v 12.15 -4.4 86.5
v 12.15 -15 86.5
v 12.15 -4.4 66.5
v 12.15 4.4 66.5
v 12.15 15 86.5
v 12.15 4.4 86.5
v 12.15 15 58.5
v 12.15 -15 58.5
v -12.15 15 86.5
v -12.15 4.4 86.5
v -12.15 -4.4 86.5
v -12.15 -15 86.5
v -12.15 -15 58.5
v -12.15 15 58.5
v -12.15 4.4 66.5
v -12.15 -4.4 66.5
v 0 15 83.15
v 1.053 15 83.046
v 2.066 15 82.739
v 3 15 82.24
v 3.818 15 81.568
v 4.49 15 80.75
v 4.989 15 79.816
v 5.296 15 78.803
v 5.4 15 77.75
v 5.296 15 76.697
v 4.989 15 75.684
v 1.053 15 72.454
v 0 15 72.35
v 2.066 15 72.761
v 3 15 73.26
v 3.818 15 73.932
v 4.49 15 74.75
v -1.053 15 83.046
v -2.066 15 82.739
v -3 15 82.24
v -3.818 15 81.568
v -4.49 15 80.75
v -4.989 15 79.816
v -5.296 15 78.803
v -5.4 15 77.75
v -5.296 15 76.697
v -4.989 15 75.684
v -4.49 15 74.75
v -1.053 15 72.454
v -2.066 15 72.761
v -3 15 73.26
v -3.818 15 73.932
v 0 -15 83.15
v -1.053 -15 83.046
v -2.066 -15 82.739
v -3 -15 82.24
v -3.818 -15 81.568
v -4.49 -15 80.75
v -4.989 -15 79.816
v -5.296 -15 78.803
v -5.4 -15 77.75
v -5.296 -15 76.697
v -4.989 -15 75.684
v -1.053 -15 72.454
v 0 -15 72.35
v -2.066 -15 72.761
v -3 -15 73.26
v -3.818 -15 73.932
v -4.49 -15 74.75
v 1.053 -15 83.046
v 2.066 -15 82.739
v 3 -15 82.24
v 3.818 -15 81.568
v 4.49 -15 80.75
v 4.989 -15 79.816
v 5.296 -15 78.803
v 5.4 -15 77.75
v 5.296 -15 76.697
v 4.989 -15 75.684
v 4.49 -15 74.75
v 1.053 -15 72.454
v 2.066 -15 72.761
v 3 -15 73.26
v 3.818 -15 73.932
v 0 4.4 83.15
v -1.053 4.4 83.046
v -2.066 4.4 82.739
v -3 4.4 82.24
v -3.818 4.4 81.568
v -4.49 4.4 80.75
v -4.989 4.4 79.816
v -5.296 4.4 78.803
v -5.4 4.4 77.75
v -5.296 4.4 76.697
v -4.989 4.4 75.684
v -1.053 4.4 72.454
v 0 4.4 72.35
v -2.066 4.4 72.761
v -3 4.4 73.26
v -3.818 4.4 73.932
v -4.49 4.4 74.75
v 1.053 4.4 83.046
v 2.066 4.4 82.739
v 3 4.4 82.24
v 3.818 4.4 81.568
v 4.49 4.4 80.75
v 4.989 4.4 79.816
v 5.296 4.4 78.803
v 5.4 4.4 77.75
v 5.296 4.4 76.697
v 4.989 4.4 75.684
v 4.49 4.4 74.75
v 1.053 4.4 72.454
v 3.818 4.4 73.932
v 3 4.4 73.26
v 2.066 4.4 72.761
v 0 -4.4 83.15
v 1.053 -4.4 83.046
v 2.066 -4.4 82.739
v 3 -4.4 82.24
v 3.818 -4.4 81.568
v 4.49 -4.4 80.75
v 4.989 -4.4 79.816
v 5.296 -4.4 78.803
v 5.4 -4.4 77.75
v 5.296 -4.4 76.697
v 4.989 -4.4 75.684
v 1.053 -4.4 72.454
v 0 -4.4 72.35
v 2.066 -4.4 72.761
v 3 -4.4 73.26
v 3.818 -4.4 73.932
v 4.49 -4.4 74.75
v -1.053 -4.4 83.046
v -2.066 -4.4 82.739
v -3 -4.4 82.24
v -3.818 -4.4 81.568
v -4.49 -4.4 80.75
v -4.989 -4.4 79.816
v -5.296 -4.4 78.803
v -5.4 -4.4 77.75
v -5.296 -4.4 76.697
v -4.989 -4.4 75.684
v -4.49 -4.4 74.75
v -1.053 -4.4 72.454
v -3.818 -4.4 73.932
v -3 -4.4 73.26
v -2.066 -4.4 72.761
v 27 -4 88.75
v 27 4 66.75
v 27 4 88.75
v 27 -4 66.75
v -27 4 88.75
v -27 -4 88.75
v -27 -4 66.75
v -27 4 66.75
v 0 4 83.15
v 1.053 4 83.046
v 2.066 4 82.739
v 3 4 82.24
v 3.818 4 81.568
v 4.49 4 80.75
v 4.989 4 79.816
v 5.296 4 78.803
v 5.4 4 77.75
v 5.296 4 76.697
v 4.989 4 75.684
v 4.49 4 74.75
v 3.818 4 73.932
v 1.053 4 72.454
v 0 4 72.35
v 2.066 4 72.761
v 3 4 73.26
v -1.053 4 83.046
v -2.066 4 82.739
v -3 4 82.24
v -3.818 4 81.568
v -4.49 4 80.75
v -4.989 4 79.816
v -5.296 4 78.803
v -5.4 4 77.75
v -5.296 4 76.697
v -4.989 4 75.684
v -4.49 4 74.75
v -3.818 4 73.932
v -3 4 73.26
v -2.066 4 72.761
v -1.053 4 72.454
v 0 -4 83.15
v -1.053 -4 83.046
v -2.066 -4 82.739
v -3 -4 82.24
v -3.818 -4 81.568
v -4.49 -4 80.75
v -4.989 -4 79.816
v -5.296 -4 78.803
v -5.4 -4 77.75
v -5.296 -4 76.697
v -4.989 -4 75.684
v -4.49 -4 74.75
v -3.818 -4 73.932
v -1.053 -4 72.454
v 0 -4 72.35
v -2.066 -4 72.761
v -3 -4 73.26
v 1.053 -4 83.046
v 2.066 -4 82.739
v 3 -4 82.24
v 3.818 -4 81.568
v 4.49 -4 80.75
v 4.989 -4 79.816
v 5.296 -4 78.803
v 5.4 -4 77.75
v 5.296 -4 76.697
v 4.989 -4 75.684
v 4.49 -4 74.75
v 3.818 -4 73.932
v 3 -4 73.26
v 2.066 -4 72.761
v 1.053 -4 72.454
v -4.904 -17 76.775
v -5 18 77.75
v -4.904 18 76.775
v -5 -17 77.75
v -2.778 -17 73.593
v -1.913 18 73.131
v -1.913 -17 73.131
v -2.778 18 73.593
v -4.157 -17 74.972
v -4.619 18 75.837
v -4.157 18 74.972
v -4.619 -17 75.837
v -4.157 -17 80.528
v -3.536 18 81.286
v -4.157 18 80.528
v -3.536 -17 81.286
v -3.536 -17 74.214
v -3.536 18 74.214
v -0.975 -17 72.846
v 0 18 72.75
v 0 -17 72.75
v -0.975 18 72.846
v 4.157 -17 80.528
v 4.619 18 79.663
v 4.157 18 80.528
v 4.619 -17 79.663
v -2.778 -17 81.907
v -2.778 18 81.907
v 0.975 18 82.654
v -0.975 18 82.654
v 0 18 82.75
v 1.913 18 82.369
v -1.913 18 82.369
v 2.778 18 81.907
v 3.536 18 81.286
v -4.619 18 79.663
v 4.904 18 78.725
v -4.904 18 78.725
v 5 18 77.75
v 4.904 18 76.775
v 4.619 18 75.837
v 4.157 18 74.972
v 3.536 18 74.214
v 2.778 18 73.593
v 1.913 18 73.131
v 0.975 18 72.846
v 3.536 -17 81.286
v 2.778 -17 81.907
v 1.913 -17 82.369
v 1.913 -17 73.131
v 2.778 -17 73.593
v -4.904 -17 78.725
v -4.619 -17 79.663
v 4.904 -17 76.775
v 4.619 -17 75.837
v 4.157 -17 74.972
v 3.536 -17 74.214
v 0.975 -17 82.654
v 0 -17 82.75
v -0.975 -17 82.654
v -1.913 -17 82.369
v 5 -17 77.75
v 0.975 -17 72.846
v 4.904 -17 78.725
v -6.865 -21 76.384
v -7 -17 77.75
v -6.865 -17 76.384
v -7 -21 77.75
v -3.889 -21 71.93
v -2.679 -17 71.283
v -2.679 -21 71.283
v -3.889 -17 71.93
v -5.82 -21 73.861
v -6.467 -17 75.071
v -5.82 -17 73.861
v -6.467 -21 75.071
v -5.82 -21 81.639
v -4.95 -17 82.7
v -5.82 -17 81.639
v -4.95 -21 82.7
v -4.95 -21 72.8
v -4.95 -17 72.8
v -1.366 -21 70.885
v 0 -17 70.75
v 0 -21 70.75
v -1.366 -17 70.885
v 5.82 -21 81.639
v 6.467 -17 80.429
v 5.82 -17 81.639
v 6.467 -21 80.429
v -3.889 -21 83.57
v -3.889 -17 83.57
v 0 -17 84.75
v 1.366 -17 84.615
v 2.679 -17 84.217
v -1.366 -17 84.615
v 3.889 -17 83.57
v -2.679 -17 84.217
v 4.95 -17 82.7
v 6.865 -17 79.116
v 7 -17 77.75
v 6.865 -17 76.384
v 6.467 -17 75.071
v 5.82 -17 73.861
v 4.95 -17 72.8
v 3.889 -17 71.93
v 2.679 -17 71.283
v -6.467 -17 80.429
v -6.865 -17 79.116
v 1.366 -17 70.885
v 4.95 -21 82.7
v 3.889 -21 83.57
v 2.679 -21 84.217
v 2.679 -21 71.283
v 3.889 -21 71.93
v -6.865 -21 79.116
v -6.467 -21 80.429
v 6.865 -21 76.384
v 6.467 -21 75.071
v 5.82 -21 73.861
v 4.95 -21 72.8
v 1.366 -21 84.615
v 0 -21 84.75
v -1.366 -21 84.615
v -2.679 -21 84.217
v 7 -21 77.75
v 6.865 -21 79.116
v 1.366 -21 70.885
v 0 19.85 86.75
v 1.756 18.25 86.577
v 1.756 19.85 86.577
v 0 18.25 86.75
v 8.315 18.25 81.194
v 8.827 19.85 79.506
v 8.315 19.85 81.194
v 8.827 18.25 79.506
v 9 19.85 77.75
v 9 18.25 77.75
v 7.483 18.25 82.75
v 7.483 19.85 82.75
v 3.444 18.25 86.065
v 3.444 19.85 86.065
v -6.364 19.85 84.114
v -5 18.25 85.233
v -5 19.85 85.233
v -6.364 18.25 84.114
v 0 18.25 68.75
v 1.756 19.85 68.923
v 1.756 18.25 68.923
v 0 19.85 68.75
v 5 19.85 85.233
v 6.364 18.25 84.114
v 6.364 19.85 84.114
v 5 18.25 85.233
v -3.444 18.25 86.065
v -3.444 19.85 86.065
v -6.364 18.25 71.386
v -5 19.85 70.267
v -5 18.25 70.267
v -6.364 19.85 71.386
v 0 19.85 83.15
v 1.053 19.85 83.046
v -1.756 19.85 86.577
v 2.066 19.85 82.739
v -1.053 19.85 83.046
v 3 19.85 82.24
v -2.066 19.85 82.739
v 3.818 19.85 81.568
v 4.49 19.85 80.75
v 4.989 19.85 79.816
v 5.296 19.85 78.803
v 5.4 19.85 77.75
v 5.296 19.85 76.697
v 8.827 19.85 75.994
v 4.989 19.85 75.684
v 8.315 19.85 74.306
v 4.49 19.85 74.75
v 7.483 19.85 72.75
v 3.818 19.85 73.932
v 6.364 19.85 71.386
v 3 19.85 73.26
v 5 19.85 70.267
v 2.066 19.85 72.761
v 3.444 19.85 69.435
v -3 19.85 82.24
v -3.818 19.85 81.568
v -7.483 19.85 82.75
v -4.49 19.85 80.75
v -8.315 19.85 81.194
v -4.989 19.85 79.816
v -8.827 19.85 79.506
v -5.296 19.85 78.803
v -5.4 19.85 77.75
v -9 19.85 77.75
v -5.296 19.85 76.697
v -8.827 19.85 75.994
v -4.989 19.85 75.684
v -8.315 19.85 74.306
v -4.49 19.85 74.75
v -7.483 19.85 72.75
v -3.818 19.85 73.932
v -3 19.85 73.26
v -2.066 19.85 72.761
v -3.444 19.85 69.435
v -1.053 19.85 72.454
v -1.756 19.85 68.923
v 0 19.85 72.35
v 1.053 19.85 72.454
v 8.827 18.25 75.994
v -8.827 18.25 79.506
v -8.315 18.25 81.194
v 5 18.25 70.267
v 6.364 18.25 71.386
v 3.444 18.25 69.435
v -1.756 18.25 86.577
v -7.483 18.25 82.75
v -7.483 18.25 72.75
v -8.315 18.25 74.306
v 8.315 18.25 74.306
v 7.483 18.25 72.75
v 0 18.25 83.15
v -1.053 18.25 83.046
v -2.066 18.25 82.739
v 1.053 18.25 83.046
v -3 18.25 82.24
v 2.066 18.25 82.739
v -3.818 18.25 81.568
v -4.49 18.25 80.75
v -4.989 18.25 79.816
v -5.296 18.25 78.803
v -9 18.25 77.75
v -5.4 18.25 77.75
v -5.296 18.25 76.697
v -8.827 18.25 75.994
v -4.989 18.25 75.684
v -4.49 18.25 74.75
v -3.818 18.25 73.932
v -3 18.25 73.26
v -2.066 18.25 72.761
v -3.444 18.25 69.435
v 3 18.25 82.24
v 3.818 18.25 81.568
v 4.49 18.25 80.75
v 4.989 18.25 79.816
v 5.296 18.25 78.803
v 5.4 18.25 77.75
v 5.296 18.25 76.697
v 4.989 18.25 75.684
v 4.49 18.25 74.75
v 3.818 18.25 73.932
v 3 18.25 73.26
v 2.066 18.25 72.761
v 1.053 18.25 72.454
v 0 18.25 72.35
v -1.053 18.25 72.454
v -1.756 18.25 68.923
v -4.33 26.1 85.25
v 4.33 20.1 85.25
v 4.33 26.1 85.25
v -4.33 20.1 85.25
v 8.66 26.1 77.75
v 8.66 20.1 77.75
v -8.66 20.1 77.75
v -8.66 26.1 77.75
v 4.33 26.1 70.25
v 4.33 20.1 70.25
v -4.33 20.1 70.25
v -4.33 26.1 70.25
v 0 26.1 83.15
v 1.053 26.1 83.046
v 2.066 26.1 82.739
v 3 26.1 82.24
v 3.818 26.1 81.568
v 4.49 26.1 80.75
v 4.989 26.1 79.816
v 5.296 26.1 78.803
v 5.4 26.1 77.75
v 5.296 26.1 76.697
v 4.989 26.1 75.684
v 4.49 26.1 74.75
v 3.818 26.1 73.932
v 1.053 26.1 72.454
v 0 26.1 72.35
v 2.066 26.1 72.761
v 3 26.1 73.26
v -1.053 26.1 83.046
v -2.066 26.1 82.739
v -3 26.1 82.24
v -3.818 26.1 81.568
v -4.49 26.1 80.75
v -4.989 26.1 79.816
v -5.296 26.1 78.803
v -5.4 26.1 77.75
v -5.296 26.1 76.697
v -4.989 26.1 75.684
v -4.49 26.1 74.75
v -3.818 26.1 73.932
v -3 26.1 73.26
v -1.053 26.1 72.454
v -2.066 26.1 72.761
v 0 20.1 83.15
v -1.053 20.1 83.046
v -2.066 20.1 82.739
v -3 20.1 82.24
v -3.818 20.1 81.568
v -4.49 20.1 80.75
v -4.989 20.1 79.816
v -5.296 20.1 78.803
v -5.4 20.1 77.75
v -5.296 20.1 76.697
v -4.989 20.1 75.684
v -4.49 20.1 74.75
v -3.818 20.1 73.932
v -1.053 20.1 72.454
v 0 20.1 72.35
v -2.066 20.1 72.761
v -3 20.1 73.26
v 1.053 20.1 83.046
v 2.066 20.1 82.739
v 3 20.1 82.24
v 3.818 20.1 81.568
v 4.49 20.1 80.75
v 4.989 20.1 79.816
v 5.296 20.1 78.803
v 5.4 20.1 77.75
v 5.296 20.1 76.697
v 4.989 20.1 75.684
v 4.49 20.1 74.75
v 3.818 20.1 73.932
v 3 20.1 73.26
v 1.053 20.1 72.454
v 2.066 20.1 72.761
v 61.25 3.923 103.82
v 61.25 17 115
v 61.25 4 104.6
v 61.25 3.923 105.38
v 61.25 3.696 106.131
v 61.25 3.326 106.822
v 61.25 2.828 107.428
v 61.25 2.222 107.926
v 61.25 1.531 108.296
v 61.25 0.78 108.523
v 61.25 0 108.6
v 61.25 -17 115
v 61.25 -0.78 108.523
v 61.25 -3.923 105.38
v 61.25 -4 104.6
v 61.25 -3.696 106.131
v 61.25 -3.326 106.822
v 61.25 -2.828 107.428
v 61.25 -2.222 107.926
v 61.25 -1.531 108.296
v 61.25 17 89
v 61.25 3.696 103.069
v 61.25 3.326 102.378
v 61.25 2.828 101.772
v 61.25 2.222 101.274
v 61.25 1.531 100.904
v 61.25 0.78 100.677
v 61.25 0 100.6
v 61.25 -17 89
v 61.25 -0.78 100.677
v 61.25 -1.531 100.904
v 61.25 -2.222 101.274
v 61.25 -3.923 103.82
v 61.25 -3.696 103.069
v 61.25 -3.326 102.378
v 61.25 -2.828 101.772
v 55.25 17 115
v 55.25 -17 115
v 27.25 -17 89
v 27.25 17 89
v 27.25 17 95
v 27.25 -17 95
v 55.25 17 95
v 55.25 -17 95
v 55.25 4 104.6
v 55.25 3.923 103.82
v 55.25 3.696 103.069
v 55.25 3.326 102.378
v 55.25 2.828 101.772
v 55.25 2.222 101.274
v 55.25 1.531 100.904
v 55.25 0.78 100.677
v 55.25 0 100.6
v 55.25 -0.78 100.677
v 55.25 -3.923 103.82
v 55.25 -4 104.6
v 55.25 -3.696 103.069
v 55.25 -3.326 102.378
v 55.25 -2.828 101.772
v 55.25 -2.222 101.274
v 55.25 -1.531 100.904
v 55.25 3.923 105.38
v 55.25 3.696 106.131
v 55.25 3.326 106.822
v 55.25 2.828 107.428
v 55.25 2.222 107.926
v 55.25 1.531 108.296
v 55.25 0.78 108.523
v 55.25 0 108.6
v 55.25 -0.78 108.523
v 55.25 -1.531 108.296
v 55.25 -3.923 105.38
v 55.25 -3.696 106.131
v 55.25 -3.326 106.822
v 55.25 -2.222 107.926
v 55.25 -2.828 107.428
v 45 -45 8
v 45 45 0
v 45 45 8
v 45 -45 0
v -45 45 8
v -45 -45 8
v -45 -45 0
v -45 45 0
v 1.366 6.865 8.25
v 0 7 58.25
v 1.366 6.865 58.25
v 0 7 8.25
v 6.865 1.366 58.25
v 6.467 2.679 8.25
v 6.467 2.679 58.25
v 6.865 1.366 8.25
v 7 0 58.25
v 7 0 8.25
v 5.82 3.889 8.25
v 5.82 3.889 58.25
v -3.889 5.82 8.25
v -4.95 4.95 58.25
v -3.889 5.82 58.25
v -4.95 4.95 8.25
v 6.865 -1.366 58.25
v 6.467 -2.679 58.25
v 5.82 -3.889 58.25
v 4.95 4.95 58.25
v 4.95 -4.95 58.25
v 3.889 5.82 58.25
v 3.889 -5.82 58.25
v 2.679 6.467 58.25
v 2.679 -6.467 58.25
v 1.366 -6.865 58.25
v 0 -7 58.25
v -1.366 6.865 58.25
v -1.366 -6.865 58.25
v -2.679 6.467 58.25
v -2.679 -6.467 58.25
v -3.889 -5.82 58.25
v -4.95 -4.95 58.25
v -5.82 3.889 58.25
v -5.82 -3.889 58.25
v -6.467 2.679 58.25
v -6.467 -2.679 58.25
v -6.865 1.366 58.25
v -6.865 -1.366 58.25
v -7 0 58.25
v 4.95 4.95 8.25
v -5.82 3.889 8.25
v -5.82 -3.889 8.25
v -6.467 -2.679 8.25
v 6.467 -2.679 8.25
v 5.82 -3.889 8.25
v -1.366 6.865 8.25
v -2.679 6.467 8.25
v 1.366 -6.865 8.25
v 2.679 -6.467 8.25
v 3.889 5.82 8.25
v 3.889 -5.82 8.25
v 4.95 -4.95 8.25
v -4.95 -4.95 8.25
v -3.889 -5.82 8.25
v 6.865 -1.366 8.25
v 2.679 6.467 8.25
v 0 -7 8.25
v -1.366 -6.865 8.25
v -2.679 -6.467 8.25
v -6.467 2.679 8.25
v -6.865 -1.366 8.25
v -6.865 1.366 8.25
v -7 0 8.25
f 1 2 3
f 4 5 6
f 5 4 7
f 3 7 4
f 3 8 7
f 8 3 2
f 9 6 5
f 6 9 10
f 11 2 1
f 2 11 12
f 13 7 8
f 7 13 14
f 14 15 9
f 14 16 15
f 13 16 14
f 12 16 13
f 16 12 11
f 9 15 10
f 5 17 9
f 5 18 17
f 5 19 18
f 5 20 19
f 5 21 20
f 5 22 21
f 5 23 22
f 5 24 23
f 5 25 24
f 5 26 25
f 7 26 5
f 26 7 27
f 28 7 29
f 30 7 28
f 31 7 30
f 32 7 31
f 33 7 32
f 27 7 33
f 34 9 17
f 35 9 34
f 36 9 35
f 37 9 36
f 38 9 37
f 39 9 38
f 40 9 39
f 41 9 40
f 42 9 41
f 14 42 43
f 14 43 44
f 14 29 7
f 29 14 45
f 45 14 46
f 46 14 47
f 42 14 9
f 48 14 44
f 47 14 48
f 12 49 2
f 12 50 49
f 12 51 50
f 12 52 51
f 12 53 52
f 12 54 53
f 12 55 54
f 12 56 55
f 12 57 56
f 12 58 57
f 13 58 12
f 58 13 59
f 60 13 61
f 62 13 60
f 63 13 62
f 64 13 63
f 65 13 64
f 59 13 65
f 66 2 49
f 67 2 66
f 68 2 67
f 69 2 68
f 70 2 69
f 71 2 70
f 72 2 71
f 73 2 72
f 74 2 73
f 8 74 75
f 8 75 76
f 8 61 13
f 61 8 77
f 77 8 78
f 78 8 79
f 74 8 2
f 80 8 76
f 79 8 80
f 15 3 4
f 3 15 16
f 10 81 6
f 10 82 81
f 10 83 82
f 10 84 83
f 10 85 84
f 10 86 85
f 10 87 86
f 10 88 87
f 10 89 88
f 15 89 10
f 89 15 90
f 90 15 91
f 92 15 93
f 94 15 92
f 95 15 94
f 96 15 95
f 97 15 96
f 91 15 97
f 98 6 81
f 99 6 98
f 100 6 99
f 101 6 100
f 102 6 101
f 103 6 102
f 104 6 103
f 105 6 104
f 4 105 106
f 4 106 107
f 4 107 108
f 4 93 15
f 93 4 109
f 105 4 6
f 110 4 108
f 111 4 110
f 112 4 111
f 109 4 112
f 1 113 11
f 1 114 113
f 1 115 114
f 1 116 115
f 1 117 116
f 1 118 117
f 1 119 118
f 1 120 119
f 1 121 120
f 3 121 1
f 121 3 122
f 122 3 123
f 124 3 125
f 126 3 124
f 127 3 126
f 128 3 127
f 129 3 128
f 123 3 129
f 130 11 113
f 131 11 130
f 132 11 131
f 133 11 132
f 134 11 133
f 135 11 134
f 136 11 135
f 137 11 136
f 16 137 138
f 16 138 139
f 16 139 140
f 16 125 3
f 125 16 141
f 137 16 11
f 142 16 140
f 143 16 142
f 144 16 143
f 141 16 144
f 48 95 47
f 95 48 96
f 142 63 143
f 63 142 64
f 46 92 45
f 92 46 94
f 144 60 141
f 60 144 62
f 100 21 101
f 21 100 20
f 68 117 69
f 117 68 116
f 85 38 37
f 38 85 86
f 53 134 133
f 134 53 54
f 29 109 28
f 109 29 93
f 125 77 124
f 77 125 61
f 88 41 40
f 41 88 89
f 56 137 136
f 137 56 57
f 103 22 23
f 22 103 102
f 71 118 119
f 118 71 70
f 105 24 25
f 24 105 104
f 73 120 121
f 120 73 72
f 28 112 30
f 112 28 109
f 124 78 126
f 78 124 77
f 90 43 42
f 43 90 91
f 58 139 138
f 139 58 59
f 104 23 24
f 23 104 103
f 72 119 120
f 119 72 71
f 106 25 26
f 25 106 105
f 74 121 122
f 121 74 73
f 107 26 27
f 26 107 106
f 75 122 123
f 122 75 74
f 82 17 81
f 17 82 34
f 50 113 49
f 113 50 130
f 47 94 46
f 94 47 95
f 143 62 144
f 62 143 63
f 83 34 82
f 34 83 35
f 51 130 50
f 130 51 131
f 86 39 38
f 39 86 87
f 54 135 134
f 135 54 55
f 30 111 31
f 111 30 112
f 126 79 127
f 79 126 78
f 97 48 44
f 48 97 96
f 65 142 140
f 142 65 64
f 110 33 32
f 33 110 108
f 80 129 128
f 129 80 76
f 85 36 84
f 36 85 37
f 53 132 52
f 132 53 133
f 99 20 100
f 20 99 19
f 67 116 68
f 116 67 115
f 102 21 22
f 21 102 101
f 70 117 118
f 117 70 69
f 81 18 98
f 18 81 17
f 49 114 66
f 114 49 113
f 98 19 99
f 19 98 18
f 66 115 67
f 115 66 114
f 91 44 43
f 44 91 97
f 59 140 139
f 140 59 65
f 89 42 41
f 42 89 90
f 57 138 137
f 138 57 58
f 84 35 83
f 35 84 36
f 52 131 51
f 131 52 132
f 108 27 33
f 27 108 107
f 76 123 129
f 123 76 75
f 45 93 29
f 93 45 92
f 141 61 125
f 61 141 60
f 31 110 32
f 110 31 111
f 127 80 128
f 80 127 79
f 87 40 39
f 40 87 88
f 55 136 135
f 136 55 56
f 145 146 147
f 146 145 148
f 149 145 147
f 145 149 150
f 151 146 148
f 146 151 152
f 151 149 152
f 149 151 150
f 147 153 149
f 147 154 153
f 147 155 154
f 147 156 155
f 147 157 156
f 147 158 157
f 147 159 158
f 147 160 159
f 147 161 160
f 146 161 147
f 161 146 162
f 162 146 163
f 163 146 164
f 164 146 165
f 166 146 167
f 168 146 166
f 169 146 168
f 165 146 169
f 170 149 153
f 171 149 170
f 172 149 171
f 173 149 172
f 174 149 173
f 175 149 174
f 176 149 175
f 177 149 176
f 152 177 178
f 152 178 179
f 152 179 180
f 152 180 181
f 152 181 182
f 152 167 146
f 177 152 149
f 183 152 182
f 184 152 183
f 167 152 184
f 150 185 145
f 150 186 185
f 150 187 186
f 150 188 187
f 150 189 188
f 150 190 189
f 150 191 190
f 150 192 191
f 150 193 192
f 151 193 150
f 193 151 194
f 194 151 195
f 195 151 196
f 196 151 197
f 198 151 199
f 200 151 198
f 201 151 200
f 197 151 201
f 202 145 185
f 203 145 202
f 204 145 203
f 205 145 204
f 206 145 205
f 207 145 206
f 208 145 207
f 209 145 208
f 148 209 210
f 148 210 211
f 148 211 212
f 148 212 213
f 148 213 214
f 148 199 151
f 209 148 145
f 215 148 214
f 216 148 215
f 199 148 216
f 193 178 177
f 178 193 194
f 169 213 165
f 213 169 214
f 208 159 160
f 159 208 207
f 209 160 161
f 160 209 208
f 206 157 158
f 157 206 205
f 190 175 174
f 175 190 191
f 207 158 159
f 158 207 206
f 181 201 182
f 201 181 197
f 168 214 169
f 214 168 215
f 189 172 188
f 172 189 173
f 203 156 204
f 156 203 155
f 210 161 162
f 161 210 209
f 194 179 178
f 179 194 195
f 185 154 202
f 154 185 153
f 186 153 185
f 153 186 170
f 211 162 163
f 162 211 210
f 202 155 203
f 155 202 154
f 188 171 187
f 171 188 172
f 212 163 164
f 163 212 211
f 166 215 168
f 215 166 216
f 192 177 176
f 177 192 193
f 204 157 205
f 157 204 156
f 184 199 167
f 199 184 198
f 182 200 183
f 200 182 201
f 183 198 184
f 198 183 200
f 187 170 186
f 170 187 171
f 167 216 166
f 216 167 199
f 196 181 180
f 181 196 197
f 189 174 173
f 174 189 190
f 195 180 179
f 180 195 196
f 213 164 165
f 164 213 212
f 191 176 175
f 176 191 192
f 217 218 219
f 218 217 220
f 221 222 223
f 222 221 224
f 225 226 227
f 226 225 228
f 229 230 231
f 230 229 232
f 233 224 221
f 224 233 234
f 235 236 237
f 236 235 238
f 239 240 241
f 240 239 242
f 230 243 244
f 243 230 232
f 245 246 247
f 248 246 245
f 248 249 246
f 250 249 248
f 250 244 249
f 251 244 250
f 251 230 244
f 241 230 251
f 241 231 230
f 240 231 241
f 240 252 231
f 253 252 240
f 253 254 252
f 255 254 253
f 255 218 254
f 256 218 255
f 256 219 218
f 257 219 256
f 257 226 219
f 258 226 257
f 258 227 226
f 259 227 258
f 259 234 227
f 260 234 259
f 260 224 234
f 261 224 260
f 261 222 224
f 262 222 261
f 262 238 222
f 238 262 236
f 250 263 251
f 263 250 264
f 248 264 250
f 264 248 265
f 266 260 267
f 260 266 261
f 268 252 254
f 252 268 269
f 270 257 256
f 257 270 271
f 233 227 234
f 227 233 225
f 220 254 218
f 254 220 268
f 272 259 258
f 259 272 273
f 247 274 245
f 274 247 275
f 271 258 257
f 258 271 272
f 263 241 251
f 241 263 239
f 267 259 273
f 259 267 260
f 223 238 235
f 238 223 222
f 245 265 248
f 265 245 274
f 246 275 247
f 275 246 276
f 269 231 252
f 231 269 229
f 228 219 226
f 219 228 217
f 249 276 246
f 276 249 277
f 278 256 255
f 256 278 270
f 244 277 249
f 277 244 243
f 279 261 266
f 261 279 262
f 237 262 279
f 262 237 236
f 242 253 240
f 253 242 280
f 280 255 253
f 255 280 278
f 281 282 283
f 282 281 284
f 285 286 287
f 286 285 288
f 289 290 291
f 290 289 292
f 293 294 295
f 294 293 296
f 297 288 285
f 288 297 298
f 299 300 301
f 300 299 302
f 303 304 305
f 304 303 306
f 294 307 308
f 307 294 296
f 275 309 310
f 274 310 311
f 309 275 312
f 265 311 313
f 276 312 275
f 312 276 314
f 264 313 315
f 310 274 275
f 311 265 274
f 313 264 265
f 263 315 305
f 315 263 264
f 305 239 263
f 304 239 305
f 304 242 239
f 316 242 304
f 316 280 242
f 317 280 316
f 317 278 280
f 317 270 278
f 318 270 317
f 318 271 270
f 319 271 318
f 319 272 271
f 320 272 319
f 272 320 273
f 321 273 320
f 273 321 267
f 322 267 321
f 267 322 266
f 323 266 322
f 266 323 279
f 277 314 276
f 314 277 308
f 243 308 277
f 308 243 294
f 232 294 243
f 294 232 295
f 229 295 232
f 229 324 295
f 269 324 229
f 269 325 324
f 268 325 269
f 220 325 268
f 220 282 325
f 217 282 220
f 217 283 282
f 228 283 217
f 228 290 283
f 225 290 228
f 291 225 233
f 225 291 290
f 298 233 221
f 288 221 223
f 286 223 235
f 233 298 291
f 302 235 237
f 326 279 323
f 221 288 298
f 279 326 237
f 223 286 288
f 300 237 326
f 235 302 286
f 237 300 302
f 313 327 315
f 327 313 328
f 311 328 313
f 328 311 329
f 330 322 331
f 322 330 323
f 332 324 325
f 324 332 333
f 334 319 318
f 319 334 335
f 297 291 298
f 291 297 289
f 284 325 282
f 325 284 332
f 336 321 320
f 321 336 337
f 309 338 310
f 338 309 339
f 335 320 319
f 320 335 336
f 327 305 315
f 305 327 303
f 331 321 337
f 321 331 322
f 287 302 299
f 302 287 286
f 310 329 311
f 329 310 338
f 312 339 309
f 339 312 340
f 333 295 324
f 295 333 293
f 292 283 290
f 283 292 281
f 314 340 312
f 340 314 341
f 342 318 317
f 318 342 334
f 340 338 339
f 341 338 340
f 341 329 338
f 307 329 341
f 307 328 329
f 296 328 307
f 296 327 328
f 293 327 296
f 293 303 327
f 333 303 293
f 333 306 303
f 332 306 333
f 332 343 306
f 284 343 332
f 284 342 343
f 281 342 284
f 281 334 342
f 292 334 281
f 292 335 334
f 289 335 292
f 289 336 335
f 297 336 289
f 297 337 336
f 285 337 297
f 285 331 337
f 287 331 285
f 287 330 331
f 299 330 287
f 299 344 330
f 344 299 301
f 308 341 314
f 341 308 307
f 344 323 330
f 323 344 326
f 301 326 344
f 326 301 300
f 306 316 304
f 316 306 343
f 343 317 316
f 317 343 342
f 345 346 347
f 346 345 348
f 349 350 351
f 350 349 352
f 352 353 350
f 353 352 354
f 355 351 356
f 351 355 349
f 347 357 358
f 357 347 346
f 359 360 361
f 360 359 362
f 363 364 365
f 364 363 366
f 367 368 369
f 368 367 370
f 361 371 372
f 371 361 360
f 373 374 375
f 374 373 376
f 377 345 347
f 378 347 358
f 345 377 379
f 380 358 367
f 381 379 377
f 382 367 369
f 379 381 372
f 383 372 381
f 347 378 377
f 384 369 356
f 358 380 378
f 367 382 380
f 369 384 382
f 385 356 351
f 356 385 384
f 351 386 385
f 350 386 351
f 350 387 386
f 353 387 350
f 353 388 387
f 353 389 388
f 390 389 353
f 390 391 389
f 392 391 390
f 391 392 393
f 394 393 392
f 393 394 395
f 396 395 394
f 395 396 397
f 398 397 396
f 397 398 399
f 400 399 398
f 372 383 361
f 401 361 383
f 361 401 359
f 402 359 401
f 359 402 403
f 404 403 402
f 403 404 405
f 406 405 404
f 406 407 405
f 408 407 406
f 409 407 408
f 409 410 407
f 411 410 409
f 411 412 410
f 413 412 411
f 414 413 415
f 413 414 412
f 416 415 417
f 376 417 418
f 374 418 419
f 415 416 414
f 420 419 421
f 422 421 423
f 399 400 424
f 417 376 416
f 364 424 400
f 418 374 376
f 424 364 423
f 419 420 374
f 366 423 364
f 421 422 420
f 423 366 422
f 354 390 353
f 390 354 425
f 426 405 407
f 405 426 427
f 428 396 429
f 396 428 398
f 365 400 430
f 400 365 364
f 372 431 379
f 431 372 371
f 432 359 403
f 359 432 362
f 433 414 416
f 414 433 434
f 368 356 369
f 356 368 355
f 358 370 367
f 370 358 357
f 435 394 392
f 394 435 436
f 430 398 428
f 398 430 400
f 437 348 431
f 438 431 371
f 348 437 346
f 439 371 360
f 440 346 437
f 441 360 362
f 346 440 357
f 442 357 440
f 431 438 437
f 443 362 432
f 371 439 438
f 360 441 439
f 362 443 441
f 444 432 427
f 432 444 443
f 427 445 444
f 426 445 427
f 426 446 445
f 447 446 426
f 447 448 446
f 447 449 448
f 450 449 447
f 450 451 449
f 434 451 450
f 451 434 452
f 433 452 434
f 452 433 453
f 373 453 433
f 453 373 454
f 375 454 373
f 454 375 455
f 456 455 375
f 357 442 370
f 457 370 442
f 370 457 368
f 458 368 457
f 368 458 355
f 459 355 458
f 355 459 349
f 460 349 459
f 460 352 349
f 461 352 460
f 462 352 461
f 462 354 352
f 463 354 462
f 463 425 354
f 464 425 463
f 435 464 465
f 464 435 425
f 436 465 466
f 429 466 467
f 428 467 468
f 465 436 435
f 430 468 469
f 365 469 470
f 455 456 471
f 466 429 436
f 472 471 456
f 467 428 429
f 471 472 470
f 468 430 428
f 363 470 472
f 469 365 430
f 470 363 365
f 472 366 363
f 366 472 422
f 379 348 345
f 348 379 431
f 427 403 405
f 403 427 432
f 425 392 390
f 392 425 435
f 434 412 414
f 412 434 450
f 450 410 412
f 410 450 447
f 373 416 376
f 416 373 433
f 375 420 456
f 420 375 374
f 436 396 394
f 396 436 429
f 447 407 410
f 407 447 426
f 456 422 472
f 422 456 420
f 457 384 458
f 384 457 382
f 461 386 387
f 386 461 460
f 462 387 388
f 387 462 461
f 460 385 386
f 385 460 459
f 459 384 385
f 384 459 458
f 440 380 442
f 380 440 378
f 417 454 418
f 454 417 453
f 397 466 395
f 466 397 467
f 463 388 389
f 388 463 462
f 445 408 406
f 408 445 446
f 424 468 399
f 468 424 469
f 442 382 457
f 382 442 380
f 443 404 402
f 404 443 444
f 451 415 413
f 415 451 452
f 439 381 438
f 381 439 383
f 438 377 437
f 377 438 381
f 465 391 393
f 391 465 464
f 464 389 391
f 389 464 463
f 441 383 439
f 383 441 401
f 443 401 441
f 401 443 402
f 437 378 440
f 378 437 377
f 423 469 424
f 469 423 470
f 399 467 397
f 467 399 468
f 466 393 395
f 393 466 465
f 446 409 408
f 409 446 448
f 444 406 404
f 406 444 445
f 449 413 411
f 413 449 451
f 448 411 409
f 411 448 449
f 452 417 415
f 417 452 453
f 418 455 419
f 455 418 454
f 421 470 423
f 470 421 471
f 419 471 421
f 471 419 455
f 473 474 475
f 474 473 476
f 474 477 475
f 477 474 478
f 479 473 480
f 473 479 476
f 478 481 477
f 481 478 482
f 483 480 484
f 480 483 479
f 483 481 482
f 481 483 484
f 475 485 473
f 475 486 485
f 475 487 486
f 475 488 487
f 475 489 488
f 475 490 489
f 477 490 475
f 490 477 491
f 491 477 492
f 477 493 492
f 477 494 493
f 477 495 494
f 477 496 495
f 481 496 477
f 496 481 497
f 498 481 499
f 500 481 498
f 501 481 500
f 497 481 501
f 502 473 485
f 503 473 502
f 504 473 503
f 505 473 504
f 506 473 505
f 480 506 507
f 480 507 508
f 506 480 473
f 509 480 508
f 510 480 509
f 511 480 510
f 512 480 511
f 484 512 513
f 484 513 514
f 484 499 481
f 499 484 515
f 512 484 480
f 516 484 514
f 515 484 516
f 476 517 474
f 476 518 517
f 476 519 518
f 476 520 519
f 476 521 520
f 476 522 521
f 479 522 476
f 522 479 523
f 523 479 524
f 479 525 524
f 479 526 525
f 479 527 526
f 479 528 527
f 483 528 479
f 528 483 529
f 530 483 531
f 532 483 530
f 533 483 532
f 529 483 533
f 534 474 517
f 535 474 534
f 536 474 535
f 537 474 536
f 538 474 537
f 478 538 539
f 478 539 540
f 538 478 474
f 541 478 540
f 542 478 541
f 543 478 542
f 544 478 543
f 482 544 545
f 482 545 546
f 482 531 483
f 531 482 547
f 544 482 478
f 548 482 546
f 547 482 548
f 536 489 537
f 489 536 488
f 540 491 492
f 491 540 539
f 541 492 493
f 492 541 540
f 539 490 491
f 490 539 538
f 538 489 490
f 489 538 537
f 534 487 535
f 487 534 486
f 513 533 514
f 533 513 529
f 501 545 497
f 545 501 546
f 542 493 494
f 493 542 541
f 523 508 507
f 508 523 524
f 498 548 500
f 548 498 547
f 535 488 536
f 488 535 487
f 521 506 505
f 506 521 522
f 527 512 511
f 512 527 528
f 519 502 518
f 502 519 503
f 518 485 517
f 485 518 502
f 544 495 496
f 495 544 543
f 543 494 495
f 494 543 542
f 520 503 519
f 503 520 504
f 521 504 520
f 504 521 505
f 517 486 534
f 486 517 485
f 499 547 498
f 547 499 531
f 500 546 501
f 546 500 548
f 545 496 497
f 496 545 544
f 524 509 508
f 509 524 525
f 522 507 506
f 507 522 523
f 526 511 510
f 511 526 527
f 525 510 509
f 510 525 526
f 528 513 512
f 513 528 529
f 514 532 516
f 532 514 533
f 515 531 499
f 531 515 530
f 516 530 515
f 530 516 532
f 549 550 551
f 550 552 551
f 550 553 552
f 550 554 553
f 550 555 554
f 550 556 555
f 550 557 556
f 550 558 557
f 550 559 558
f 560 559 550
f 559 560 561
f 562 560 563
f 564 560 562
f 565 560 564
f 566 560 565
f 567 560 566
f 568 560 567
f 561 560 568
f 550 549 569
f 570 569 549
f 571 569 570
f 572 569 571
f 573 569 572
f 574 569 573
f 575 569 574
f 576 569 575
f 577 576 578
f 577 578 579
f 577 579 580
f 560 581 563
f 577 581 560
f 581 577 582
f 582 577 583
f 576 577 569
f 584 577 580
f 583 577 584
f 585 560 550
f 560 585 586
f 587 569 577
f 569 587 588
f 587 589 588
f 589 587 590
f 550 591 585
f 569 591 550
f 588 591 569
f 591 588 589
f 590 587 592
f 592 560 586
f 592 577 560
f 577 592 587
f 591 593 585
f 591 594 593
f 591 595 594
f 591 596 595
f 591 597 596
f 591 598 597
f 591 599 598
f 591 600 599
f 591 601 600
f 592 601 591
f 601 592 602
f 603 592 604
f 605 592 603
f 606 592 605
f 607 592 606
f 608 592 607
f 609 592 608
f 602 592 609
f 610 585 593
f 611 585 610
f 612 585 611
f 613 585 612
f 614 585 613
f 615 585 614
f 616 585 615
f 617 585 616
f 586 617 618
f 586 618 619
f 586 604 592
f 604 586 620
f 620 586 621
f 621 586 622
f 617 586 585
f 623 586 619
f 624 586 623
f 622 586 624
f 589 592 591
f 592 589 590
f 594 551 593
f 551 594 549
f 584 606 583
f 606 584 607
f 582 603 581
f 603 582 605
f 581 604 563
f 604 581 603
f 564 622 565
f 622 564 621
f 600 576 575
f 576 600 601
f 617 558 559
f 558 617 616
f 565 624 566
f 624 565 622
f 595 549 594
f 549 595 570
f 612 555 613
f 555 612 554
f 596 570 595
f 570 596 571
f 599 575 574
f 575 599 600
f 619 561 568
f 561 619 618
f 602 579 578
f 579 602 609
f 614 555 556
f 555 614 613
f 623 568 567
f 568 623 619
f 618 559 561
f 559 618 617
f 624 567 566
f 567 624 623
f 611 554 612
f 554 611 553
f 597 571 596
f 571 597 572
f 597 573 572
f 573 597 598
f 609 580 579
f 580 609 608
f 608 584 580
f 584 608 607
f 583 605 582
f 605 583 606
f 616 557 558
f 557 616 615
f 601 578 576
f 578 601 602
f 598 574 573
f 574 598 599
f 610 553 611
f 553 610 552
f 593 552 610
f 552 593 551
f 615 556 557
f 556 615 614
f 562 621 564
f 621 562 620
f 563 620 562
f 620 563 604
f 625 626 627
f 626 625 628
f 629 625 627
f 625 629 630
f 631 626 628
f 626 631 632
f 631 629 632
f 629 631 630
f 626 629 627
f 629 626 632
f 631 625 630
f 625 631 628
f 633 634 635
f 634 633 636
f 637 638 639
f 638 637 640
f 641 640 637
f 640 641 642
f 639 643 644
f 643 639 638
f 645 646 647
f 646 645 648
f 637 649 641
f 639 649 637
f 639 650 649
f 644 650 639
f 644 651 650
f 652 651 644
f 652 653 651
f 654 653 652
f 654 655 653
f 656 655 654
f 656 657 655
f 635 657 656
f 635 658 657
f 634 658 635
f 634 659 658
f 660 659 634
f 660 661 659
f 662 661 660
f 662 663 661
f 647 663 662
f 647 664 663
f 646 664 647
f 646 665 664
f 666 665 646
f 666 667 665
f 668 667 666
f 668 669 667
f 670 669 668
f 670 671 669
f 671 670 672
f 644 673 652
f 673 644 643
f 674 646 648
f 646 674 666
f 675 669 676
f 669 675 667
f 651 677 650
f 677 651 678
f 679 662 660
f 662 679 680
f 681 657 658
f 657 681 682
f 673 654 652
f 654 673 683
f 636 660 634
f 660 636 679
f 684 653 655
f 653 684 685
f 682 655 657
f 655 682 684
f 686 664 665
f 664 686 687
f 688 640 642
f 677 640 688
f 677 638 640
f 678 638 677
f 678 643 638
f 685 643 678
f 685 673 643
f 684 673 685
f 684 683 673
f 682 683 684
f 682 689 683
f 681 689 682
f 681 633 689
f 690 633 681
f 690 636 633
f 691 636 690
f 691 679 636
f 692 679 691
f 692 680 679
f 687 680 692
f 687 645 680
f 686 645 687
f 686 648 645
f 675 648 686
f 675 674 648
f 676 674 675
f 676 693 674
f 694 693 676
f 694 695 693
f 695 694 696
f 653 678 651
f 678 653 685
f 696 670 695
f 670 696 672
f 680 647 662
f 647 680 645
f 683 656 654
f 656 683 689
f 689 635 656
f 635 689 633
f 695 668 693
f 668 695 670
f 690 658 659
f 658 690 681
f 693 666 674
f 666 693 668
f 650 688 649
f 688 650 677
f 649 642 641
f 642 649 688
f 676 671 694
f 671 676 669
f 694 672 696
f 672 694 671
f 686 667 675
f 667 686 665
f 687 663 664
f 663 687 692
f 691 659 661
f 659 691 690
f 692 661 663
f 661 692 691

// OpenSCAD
$fn = 32;

// ------------------------------------------------------------------------
// Lamp arm: column d14 x 50 mm, arm 54 mm
// Every part is its own module, assembly() places every instance.
// ------------------------------------------------------------------------

// --- part 1 ---
module lamp_base() {
  difference() {
    translate([-45, -45, 0]) cube([90, 90, 8]);
  }
}

// --- part 2 ---
module lamp_column() {
  cylinder(h = 50, d = 14);
}

// --- part 3 ---
module head_fork() {
  difference() {
    translate([-12.15, -15, 0]) cube([24.3, 30, 28]);
    translate([-13.15, -4.4, 8]) cube([26.3, 8.8, 21]);
    translate([0, 0, 19.25]) rotate([90, 0, 0]) cylinder(h = 32, d = 10.8, center = true);
  }
}

// --- part 4 ---
module lamp_arm() {
  difference() {
    translate([-27, -4, 0]) cube([54, 8, 22]);
    translate([0, 0, 11]) rotate([90, 0, 0]) cylinder(h = 10, d = 10.8, center = true);
  }
}

// --- part 5 ---
module arm_pin() {
  rotate([0, 90, 0]) cylinder(h = 36, d = 10, center = true);
  translate([-21, 0, 0]) rotate([0, 90, 0]) cylinder(h = 4, d = 14);
}

// --- part 6 ---
module arm_washer() {
  difference() {
      translate([0, 0, 0]) cylinder(h = 1.6, d = 18);
      translate([0, 0, -1]) cylinder(h = 3.6, d = 10.8);
    }
}

// --- part 7 ---
module arm_nut() {
  difference() {
    linear_extrude(height = 6) polygon(points = [[8.66, 0], [4.33, 7.5], [-4.33, 7.5], [-8.66, 0], [-4.33, -7.5], [4.33, -7.5]]);
    translate([0, 0, -1]) cylinder(h = 8, d = 10.8);
  }
}

// --- part 8 ---
module shade_bracket() {
  difference() {
    translate([-17, -17, 0]) cube([34, 34, 26]);
    translate([-18, -18, 6]) cube([29, 36, 21]);
    translate([14, 0, 15.6]) rotate([0, 90, 0]) cylinder(h = 8, d = 8, center = true);
  }
}

// --- assembly ---
module assembly() {
  color([0.80, 0.24, 0.20]) translate([0, 0, 0]) rotate([0, 0, 0]) lamp_base();
  color([0.20, 0.45, 0.75]) translate([0, 0, 8.25]) rotate([0, 0, 0]) lamp_column();
  color([0.25, 0.62, 0.32]) translate([0, 0, 58.5]) rotate([0, 0, 0]) head_fork();
  color([0.92, 0.70, 0.18]) translate([0, 0, 66.75]) rotate([0, 0, 0]) lamp_arm();
  color([0.58, 0.35, 0.70]) translate([0, 0, 77.75]) rotate([0, 0, 90]) arm_pin();
  color([0.16, 0.66, 0.66]) translate([0, 19.85, 77.75]) rotate([90, 0, 0]) arm_washer();
  color([0.85, 0.48, 0.18]) translate([0, 26.1, 77.75]) rotate([90, 0, 0]) arm_nut();
  color([0.55, 0.60, 0.65]) translate([44.25, 0, 89]) rotate([0, 0, 0]) shade_bracket();
}

assembly();
